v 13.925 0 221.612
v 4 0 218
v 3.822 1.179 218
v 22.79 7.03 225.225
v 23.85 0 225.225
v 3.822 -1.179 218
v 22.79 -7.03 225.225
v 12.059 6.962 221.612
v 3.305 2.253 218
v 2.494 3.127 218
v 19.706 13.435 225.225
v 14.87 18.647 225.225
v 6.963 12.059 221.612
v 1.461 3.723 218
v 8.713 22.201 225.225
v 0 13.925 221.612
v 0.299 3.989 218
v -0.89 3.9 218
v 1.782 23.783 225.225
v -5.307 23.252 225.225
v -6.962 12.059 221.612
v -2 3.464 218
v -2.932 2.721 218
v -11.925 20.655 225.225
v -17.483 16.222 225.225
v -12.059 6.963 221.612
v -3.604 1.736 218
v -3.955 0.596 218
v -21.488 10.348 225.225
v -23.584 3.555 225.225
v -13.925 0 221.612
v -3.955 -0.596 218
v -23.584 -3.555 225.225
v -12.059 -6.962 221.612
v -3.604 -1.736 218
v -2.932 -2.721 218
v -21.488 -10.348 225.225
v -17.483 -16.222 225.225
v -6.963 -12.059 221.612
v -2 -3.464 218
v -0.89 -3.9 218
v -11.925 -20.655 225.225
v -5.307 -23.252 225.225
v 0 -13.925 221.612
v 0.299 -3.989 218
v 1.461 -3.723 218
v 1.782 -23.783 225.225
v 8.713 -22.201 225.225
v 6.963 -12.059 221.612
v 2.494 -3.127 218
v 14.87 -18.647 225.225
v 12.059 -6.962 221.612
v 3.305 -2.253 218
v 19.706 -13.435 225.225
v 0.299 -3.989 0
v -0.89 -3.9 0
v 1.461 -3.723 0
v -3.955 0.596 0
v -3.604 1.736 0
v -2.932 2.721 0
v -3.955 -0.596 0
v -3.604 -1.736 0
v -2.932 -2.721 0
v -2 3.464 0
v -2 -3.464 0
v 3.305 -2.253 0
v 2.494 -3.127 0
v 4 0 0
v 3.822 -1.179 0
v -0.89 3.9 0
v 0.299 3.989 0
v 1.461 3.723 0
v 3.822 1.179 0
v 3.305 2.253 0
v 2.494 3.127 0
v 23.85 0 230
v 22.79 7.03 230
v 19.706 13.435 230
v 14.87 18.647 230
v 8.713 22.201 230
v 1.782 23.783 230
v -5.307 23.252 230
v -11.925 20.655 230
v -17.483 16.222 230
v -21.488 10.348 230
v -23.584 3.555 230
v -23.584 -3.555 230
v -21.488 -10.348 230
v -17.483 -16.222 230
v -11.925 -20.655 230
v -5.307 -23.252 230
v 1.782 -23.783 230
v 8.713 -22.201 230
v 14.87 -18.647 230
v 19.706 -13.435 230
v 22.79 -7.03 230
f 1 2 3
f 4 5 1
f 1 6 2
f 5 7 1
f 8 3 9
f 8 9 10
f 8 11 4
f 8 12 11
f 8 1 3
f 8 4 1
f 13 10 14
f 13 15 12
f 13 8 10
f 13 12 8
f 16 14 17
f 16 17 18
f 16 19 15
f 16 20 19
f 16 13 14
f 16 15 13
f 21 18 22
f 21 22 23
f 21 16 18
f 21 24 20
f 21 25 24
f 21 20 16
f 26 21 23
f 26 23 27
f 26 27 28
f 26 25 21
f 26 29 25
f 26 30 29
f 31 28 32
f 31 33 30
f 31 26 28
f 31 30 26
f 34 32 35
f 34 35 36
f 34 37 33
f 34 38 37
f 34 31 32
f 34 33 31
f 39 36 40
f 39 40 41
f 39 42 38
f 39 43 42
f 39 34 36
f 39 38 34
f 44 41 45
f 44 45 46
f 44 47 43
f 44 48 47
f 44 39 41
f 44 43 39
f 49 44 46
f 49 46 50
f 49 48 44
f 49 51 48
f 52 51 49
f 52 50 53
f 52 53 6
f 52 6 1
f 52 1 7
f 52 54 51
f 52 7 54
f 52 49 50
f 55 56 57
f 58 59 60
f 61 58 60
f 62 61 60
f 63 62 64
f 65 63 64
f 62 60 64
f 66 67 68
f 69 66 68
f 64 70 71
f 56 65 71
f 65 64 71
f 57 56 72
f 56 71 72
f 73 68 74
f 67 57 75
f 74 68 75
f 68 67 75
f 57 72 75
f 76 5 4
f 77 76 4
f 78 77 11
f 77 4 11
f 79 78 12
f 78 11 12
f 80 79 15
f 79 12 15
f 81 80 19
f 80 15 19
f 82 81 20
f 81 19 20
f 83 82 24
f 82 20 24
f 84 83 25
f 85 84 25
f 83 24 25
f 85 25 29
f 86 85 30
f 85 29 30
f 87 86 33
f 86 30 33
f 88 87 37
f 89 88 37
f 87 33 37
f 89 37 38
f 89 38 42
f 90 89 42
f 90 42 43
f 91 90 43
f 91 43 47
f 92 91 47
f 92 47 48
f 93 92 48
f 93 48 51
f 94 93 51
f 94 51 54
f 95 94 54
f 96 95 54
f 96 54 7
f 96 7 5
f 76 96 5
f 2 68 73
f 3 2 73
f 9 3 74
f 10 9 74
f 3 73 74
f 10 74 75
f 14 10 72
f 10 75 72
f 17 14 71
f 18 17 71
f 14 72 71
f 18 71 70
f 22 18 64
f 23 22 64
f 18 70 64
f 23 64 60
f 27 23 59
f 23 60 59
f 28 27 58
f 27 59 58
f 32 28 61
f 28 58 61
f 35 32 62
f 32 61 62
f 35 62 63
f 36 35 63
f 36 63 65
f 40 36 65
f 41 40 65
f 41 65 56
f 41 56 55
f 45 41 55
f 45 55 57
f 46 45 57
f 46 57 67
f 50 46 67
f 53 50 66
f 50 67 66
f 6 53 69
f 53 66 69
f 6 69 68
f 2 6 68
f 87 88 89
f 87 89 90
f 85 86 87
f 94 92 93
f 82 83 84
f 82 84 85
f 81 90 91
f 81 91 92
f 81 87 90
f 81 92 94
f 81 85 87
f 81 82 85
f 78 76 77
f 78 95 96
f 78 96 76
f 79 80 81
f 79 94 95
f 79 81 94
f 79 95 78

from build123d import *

# Parameters (mm, degrees)
SKETCH1_R           = 23.85
BOSS_EXTRUDE1_DEPTH = 230
SKETCH2_OUTSIDE_W   = 97.638
SKETCH2_OUTSIDE_H   = 97.638
SKETCH2_OUTSIDE_R   = 4
CUT_EXTRUDE1_DEPTH  = 218


with BuildPart() as part:
    # Sketch1 → Boss-Extrude1 (new body)
    with BuildSketch(Plane.XY):
        Circle(SKETCH1_R)
    extrude(amount=BOSS_EXTRUDE1_DEPTH)

    # Sketch2 outside → Cut-Extrude1 (cut)
    with BuildSketch(Plane.XY):
        Rectangle(SKETCH2_OUTSIDE_W, SKETCH2_OUTSIDE_H)
        Circle(SKETCH2_OUTSIDE_R, mode=Mode.SUBTRACT)
    extrude(amount=CUT_EXTRUDE1_DEPTH, mode=Mode.SUBTRACT)

    # Sketch5 → Cut-Revolve1 (revolve, cut)
    with BuildSketch(Plane(origin=(0, 0, 0), x_dir=(1, 0, 0), z_dir=(0, 1, 0))):
        Polygon((4, -218), (23.85, -225.22480915), (23.85, -218), align=None)
    revolve(axis=Axis((0, 0, 0), (0, 0, 1)), mode=Mode.SUBTRACT)


solid = part.part
